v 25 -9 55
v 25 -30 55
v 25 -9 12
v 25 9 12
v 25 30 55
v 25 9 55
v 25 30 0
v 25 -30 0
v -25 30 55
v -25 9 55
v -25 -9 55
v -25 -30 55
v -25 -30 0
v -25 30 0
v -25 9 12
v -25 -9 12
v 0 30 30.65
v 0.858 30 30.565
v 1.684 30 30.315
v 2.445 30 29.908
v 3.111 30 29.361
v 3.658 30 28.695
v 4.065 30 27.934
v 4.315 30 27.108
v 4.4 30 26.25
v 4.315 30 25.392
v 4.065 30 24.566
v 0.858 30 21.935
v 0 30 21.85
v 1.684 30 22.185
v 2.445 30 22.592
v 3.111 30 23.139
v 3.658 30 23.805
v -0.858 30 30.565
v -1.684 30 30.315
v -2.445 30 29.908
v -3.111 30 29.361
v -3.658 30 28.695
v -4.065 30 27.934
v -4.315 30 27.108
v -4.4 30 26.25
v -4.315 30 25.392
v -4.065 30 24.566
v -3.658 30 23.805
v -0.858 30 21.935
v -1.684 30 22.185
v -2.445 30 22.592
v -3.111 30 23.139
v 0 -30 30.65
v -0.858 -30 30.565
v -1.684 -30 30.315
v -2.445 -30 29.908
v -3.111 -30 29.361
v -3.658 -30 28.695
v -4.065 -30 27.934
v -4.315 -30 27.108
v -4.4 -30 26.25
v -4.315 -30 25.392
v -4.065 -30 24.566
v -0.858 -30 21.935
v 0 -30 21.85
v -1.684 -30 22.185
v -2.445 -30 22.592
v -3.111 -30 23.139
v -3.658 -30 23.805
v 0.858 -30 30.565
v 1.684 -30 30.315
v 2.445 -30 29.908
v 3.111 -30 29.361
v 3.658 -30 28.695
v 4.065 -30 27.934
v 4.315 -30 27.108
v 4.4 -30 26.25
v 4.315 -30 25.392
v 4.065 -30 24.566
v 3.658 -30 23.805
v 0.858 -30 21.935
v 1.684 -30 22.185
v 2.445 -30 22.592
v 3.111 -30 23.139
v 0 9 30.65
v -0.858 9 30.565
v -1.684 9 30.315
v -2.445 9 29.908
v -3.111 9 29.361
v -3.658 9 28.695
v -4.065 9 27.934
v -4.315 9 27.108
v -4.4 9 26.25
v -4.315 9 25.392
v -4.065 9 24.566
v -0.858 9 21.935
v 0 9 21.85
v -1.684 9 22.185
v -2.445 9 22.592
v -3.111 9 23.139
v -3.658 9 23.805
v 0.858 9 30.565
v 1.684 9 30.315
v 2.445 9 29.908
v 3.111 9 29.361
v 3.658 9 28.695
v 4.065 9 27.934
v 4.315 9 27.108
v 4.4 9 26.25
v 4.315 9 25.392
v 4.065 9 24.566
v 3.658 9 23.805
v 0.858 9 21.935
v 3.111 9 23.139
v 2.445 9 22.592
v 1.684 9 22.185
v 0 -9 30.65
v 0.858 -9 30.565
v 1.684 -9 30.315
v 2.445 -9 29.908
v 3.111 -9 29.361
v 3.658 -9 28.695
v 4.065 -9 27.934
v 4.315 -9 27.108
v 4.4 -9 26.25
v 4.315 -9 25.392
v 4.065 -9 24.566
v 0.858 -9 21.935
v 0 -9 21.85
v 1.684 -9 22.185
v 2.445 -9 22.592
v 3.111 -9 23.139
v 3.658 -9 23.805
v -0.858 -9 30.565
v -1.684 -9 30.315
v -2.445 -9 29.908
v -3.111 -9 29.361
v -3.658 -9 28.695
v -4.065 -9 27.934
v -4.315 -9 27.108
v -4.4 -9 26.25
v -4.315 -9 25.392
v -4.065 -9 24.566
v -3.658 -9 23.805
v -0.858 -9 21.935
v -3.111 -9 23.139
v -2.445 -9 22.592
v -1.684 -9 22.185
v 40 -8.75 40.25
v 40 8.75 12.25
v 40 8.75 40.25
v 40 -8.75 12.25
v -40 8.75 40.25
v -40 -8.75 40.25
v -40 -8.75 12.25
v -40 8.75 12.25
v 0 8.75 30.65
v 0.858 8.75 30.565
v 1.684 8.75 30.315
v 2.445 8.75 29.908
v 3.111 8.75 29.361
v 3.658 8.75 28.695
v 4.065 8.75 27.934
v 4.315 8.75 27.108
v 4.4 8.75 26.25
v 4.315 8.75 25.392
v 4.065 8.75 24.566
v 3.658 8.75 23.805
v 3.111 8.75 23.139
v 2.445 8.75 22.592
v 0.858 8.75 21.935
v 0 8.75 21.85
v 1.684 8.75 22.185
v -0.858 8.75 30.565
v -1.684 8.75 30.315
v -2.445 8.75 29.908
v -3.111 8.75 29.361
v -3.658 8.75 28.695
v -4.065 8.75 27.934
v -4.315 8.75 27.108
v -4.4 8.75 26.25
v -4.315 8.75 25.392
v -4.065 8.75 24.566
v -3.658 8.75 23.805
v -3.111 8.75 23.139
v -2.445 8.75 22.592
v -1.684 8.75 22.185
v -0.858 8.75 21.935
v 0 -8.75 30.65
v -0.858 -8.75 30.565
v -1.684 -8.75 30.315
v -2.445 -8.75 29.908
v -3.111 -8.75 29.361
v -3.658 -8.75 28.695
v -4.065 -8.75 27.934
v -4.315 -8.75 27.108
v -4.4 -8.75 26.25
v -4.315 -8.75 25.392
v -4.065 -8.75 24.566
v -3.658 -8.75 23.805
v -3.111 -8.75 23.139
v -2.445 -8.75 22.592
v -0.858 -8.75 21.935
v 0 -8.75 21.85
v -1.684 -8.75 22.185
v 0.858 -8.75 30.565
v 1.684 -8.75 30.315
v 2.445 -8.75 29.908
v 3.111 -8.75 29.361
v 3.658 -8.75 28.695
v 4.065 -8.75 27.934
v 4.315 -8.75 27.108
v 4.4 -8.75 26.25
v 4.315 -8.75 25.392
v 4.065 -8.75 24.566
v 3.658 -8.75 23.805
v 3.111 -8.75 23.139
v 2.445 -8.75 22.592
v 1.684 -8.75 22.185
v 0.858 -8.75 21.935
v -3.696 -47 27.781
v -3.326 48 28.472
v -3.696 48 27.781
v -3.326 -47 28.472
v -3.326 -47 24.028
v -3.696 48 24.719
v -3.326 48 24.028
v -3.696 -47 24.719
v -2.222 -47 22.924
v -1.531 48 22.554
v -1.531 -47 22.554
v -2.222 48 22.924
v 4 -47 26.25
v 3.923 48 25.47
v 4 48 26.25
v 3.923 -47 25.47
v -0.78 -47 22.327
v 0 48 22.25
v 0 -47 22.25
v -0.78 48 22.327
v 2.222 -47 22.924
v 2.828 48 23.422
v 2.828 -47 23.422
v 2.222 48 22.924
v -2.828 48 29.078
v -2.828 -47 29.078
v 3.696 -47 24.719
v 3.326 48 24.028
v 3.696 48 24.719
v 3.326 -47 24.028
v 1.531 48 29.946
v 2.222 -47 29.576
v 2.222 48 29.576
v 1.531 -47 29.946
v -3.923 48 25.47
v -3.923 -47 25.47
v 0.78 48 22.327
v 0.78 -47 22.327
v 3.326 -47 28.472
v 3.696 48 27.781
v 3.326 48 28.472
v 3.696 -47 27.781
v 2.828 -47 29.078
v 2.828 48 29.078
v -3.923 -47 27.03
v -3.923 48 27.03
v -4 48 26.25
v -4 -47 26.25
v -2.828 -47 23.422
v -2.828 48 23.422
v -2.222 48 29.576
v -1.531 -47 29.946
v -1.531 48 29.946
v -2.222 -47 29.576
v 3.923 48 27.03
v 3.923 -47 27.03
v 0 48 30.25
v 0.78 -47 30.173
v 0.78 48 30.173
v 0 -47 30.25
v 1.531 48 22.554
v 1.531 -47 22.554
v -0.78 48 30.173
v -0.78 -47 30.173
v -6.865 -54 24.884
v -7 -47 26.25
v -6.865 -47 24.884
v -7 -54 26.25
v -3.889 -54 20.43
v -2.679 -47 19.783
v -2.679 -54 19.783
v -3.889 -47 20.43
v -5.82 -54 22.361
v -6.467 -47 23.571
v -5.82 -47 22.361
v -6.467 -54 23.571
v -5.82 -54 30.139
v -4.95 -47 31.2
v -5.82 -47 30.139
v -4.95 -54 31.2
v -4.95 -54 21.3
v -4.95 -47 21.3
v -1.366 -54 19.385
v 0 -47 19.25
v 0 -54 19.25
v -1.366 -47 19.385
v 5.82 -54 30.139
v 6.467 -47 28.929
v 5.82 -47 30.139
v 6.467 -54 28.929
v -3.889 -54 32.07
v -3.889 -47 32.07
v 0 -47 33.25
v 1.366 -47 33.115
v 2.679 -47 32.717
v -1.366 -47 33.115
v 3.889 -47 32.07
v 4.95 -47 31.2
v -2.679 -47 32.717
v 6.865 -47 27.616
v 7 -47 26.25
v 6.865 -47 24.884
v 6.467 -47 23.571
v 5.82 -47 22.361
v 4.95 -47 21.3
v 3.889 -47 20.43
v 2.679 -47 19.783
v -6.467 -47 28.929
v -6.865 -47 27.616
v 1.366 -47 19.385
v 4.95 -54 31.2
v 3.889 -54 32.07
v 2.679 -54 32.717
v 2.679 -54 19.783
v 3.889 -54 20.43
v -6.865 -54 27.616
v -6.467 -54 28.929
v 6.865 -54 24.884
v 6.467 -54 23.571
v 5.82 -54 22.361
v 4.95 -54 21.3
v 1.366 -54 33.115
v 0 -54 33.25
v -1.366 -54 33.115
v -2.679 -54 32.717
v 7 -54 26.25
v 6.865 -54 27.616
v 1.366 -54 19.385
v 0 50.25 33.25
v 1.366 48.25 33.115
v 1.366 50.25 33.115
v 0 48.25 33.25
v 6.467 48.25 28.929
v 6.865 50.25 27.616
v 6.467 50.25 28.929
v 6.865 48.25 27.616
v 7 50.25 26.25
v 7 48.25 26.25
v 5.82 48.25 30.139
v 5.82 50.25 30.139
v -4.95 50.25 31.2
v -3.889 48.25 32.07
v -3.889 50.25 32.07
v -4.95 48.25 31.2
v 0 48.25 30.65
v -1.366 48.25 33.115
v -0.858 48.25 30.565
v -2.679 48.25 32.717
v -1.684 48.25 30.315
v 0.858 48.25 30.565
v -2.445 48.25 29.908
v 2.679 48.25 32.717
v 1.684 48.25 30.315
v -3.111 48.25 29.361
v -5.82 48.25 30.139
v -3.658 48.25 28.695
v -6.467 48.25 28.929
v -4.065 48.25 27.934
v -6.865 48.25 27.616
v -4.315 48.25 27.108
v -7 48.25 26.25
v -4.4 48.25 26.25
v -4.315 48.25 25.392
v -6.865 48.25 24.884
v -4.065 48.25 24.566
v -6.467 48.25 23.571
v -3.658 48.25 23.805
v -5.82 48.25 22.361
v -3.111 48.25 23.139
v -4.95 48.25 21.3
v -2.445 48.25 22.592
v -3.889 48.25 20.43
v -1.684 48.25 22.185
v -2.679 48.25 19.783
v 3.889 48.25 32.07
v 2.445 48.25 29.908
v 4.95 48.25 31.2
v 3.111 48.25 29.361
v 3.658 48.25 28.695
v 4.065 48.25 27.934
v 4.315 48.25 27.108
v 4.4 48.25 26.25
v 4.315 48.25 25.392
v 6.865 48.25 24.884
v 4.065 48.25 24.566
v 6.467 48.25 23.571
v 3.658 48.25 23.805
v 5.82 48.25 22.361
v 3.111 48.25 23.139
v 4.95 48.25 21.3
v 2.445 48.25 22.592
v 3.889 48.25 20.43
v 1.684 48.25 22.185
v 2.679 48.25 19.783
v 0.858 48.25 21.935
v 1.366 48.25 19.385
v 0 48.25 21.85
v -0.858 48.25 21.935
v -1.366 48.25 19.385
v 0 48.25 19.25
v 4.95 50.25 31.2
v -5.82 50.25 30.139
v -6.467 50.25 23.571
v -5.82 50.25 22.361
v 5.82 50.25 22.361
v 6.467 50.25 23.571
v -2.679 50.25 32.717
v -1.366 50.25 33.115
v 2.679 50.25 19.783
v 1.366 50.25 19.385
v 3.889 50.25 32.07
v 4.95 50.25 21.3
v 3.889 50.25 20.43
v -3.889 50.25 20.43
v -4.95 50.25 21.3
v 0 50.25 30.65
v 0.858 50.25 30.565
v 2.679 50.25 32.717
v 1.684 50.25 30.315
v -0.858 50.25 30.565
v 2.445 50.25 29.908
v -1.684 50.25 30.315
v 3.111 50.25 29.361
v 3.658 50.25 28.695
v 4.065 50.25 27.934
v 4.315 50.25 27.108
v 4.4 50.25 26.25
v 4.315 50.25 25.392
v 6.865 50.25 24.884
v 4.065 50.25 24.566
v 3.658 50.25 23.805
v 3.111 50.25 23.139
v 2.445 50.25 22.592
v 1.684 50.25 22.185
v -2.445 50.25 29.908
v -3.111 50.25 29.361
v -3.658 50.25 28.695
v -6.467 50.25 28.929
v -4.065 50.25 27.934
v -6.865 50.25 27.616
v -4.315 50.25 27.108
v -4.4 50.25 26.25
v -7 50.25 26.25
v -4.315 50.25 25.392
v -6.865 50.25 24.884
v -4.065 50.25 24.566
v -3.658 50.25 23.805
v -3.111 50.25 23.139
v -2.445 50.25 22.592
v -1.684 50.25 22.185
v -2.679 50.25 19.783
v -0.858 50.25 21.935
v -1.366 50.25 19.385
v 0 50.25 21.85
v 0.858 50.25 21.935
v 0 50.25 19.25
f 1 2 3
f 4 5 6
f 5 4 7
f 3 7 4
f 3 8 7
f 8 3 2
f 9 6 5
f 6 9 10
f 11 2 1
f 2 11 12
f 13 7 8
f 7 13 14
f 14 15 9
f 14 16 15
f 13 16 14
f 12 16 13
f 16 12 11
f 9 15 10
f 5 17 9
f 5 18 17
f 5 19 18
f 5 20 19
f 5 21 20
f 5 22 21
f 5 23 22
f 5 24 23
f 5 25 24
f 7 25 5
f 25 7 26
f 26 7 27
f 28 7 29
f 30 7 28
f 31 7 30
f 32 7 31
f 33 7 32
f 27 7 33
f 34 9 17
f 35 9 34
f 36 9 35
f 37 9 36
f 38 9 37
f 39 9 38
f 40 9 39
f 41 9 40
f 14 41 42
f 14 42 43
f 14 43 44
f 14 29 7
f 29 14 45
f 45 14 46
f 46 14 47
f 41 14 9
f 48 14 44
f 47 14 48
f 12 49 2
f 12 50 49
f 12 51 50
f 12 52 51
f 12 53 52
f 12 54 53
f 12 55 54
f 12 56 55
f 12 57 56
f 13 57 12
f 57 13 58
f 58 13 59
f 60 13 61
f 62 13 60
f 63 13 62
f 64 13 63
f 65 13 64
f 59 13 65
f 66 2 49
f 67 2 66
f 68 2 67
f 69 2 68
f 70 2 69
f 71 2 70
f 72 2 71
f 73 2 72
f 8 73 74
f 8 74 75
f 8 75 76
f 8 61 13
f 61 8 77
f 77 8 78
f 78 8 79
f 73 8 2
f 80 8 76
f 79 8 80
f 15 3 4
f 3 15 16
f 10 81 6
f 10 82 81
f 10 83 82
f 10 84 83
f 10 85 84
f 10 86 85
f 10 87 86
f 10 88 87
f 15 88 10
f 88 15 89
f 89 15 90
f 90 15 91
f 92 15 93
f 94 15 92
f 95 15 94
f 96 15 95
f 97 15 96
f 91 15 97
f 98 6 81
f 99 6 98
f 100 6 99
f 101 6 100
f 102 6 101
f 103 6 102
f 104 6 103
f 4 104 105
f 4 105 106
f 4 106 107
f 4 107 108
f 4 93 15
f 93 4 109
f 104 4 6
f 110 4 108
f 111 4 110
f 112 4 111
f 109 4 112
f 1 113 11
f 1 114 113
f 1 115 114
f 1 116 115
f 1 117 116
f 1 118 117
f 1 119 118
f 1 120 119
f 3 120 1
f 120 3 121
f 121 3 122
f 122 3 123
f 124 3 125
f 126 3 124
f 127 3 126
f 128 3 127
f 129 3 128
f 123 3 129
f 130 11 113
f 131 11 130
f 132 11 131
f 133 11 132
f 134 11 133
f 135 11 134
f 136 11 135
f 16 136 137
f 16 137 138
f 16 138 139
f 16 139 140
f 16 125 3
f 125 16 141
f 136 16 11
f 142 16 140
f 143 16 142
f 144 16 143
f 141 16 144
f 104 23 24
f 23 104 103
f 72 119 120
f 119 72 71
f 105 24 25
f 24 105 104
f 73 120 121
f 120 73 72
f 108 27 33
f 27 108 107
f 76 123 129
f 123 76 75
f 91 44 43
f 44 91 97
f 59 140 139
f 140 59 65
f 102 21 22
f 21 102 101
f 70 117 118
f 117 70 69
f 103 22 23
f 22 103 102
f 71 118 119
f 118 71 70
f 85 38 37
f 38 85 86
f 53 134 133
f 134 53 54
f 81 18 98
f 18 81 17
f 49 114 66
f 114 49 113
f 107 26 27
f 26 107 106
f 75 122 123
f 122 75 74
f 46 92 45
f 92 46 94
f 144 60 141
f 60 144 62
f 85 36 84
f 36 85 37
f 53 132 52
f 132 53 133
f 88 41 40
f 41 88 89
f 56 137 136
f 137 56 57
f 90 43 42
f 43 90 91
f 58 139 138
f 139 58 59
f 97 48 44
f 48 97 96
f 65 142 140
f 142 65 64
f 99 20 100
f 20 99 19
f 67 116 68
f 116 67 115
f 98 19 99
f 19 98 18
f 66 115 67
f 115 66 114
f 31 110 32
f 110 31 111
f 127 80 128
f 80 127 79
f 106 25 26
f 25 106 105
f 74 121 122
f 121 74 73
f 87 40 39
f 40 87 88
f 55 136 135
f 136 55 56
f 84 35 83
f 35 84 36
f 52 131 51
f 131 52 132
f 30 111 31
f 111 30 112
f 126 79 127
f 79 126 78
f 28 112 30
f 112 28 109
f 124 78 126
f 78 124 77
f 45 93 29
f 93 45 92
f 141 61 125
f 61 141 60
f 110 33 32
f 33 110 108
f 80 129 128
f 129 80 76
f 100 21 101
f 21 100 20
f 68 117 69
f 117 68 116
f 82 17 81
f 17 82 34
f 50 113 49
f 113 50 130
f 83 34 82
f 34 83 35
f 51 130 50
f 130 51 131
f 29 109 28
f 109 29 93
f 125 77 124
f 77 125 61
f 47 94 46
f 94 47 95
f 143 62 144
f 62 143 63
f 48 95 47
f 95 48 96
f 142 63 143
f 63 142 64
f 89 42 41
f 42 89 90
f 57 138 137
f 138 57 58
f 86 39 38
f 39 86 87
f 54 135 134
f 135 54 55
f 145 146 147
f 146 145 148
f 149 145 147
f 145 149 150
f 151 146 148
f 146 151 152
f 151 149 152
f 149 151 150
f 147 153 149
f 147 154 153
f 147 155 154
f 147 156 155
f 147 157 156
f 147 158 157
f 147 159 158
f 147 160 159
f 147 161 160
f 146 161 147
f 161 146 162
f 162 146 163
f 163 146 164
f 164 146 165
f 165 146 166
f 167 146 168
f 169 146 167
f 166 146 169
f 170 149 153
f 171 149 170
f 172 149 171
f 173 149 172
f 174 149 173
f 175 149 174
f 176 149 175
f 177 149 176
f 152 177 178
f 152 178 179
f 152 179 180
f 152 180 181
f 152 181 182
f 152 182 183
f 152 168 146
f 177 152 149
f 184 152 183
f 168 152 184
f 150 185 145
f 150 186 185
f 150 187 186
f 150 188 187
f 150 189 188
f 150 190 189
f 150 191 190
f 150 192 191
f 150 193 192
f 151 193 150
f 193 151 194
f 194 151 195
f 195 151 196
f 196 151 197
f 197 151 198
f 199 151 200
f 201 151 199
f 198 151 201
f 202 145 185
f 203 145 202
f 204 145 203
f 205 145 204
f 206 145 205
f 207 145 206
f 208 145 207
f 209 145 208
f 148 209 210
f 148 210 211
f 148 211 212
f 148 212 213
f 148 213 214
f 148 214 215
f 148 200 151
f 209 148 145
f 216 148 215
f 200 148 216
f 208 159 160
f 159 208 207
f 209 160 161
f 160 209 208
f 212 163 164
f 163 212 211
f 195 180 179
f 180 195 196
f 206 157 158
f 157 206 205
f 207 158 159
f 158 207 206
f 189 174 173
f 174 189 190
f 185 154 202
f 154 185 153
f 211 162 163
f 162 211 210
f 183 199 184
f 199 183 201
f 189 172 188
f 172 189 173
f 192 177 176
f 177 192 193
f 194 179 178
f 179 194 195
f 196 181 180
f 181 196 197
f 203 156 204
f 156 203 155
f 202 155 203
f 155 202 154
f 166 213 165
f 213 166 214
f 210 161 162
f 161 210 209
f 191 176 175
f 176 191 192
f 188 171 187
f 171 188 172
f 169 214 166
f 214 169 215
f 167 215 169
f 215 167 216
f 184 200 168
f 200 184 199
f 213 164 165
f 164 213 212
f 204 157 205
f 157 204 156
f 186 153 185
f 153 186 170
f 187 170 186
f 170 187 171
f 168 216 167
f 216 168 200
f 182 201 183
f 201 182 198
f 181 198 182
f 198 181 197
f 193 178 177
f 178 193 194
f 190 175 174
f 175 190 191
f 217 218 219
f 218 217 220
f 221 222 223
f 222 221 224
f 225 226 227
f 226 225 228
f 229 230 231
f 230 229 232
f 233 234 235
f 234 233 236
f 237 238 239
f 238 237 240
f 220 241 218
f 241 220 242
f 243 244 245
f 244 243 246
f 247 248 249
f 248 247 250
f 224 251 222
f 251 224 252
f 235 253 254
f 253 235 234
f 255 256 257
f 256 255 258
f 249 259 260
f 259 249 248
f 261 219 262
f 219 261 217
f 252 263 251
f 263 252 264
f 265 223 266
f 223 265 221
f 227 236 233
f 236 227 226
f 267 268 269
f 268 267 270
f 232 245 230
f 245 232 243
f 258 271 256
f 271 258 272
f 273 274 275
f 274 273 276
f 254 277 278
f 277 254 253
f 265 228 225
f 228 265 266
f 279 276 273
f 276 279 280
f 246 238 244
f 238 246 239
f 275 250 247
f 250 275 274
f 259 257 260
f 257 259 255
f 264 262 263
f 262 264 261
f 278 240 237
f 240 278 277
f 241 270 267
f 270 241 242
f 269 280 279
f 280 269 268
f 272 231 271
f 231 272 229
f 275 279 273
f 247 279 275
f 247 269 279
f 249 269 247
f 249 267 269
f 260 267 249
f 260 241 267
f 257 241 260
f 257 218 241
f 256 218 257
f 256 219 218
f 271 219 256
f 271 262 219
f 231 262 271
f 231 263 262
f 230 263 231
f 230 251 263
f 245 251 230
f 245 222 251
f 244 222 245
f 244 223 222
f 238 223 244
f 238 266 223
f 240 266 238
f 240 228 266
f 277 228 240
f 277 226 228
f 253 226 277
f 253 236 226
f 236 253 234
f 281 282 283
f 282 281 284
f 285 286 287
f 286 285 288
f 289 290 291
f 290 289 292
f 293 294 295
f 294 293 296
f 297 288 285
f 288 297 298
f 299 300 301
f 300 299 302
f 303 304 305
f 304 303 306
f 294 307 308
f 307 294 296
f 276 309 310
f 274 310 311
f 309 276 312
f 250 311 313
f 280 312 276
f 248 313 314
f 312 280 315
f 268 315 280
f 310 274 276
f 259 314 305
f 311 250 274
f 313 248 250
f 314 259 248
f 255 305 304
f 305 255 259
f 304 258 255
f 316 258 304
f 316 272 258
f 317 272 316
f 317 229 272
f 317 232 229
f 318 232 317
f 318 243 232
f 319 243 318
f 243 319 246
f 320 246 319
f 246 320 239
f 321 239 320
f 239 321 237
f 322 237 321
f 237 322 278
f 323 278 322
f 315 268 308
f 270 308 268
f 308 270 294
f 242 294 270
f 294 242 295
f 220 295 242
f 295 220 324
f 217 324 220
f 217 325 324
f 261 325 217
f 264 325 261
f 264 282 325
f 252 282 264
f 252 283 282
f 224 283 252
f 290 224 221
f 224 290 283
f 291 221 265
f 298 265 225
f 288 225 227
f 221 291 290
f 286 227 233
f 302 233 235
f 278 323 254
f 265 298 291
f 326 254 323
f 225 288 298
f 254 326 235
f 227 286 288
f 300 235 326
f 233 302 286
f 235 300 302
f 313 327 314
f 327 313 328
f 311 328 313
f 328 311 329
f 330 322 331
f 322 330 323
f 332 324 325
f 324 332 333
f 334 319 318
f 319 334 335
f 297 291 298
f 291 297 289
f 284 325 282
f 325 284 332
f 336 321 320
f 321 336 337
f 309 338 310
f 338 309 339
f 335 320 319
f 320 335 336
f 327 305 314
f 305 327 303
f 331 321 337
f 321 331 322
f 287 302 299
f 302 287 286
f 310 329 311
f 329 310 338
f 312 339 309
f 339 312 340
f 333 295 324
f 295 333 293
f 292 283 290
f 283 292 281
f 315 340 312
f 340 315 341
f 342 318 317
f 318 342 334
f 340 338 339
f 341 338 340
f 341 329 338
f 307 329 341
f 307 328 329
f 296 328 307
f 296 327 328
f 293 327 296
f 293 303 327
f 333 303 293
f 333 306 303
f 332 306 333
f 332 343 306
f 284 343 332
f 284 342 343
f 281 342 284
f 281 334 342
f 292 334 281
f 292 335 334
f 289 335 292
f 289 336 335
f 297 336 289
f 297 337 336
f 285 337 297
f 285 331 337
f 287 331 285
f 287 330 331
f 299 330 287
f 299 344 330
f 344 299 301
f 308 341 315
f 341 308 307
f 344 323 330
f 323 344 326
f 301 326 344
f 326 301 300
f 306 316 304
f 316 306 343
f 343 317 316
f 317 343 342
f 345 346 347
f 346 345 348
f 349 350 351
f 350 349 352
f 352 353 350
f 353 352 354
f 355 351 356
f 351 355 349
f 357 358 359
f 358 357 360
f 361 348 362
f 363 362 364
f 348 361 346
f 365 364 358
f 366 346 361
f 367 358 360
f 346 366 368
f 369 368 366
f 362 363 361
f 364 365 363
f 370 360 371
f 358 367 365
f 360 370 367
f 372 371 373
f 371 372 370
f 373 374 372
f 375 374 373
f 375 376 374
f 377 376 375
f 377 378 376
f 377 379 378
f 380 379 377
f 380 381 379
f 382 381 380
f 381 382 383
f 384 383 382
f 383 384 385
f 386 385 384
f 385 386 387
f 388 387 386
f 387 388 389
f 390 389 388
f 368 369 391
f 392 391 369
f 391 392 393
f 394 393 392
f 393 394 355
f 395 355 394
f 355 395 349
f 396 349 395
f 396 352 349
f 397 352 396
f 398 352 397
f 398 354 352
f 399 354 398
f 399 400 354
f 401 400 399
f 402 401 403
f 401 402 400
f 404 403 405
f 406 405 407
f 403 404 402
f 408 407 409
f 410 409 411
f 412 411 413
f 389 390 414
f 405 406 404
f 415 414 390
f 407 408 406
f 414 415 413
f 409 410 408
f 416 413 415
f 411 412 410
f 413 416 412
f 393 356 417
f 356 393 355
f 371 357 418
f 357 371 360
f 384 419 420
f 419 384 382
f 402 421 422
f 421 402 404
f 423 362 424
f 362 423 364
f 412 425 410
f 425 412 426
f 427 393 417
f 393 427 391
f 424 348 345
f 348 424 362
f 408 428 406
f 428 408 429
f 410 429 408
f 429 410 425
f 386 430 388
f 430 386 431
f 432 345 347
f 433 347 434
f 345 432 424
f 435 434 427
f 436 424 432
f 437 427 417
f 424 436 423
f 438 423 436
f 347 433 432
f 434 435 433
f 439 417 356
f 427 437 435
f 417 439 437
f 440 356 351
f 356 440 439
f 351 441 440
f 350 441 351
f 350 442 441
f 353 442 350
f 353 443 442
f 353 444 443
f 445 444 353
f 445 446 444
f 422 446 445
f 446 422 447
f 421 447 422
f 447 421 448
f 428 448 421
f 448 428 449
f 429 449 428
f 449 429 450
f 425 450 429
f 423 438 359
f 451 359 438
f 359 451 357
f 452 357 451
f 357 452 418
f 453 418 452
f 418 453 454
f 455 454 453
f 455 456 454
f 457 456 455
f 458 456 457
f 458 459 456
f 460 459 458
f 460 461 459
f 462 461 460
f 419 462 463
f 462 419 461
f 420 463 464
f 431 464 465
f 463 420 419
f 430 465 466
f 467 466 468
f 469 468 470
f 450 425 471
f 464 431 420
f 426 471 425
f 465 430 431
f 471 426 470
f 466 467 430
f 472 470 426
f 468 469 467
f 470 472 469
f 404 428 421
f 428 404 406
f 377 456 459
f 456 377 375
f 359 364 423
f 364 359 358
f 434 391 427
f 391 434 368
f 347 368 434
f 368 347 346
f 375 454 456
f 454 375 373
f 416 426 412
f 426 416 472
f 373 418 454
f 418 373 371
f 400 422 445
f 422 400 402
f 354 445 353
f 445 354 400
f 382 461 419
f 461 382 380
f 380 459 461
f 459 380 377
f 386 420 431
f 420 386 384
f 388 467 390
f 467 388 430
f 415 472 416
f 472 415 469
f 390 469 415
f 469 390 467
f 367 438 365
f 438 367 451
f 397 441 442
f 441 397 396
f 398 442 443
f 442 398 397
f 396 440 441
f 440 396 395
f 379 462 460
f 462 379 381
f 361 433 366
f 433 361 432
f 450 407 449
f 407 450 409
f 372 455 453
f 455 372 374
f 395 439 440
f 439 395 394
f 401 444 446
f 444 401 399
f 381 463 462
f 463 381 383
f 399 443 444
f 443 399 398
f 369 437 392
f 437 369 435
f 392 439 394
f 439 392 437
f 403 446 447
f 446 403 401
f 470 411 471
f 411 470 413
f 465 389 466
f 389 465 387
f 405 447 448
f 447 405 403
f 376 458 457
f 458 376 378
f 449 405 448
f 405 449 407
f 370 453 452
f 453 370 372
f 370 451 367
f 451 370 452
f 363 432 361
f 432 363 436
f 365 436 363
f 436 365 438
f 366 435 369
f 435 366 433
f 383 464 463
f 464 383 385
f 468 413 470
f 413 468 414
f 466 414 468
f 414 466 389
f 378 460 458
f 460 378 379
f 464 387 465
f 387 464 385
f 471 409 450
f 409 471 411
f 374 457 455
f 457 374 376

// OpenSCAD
$fn = 32;

// ------------------------------------------------------------------------
// Clevis joint: 50 mm clevis, pin d8
// Every part is its own module, assembly() places them once.
// ------------------------------------------------------------------------

// --- part 1 ---
module clevis() {
  difference() {
    translate([-25, -30, 0]) cube([50, 60, 55]);
    translate([-26, -9, 12]) cube([52, 18, 44]);
    translate([0, 0, 26.25]) rotate([90, 0, 0]) cylinder(h = 62, d = 8.8, center = true);
  }
}

// --- part 2 ---
module eye() {
  difference() {
    translate([-40, -8.75, 0]) cube([80, 17.5, 28]);
    translate([0, 0, 14]) rotate([90, 0, 0]) cylinder(h = 19.5, d = 8.8, center = true);
  }
}

// --- part 3 ---
module pin() {
  rotate([0, 90, 0]) cylinder(h = 96, d = 8, center = true);
  translate([-54, 0, 0]) rotate([0, 90, 0]) cylinder(h = 7, d = 14);
}

// --- part 4 ---
module retainer() {
  difference() {
      translate([0, 0, 0]) cylinder(h = 2, d = 14);
      translate([0, 0, -1]) cylinder(h = 4, d = 8.8);
    }
}

// --- assembly ---
module assembly() {
  translate([0, 0, 0]) rotate([0, 0, 0]) clevis();
  translate([0, 0, 12.25]) rotate([0, 0, 0]) eye();
  translate([0, 0, 26.25]) rotate([0, 0, 90]) pin();
  translate([0, 50.25, 26.25]) rotate([90, 0, 0]) retainer();
}

assembly();
